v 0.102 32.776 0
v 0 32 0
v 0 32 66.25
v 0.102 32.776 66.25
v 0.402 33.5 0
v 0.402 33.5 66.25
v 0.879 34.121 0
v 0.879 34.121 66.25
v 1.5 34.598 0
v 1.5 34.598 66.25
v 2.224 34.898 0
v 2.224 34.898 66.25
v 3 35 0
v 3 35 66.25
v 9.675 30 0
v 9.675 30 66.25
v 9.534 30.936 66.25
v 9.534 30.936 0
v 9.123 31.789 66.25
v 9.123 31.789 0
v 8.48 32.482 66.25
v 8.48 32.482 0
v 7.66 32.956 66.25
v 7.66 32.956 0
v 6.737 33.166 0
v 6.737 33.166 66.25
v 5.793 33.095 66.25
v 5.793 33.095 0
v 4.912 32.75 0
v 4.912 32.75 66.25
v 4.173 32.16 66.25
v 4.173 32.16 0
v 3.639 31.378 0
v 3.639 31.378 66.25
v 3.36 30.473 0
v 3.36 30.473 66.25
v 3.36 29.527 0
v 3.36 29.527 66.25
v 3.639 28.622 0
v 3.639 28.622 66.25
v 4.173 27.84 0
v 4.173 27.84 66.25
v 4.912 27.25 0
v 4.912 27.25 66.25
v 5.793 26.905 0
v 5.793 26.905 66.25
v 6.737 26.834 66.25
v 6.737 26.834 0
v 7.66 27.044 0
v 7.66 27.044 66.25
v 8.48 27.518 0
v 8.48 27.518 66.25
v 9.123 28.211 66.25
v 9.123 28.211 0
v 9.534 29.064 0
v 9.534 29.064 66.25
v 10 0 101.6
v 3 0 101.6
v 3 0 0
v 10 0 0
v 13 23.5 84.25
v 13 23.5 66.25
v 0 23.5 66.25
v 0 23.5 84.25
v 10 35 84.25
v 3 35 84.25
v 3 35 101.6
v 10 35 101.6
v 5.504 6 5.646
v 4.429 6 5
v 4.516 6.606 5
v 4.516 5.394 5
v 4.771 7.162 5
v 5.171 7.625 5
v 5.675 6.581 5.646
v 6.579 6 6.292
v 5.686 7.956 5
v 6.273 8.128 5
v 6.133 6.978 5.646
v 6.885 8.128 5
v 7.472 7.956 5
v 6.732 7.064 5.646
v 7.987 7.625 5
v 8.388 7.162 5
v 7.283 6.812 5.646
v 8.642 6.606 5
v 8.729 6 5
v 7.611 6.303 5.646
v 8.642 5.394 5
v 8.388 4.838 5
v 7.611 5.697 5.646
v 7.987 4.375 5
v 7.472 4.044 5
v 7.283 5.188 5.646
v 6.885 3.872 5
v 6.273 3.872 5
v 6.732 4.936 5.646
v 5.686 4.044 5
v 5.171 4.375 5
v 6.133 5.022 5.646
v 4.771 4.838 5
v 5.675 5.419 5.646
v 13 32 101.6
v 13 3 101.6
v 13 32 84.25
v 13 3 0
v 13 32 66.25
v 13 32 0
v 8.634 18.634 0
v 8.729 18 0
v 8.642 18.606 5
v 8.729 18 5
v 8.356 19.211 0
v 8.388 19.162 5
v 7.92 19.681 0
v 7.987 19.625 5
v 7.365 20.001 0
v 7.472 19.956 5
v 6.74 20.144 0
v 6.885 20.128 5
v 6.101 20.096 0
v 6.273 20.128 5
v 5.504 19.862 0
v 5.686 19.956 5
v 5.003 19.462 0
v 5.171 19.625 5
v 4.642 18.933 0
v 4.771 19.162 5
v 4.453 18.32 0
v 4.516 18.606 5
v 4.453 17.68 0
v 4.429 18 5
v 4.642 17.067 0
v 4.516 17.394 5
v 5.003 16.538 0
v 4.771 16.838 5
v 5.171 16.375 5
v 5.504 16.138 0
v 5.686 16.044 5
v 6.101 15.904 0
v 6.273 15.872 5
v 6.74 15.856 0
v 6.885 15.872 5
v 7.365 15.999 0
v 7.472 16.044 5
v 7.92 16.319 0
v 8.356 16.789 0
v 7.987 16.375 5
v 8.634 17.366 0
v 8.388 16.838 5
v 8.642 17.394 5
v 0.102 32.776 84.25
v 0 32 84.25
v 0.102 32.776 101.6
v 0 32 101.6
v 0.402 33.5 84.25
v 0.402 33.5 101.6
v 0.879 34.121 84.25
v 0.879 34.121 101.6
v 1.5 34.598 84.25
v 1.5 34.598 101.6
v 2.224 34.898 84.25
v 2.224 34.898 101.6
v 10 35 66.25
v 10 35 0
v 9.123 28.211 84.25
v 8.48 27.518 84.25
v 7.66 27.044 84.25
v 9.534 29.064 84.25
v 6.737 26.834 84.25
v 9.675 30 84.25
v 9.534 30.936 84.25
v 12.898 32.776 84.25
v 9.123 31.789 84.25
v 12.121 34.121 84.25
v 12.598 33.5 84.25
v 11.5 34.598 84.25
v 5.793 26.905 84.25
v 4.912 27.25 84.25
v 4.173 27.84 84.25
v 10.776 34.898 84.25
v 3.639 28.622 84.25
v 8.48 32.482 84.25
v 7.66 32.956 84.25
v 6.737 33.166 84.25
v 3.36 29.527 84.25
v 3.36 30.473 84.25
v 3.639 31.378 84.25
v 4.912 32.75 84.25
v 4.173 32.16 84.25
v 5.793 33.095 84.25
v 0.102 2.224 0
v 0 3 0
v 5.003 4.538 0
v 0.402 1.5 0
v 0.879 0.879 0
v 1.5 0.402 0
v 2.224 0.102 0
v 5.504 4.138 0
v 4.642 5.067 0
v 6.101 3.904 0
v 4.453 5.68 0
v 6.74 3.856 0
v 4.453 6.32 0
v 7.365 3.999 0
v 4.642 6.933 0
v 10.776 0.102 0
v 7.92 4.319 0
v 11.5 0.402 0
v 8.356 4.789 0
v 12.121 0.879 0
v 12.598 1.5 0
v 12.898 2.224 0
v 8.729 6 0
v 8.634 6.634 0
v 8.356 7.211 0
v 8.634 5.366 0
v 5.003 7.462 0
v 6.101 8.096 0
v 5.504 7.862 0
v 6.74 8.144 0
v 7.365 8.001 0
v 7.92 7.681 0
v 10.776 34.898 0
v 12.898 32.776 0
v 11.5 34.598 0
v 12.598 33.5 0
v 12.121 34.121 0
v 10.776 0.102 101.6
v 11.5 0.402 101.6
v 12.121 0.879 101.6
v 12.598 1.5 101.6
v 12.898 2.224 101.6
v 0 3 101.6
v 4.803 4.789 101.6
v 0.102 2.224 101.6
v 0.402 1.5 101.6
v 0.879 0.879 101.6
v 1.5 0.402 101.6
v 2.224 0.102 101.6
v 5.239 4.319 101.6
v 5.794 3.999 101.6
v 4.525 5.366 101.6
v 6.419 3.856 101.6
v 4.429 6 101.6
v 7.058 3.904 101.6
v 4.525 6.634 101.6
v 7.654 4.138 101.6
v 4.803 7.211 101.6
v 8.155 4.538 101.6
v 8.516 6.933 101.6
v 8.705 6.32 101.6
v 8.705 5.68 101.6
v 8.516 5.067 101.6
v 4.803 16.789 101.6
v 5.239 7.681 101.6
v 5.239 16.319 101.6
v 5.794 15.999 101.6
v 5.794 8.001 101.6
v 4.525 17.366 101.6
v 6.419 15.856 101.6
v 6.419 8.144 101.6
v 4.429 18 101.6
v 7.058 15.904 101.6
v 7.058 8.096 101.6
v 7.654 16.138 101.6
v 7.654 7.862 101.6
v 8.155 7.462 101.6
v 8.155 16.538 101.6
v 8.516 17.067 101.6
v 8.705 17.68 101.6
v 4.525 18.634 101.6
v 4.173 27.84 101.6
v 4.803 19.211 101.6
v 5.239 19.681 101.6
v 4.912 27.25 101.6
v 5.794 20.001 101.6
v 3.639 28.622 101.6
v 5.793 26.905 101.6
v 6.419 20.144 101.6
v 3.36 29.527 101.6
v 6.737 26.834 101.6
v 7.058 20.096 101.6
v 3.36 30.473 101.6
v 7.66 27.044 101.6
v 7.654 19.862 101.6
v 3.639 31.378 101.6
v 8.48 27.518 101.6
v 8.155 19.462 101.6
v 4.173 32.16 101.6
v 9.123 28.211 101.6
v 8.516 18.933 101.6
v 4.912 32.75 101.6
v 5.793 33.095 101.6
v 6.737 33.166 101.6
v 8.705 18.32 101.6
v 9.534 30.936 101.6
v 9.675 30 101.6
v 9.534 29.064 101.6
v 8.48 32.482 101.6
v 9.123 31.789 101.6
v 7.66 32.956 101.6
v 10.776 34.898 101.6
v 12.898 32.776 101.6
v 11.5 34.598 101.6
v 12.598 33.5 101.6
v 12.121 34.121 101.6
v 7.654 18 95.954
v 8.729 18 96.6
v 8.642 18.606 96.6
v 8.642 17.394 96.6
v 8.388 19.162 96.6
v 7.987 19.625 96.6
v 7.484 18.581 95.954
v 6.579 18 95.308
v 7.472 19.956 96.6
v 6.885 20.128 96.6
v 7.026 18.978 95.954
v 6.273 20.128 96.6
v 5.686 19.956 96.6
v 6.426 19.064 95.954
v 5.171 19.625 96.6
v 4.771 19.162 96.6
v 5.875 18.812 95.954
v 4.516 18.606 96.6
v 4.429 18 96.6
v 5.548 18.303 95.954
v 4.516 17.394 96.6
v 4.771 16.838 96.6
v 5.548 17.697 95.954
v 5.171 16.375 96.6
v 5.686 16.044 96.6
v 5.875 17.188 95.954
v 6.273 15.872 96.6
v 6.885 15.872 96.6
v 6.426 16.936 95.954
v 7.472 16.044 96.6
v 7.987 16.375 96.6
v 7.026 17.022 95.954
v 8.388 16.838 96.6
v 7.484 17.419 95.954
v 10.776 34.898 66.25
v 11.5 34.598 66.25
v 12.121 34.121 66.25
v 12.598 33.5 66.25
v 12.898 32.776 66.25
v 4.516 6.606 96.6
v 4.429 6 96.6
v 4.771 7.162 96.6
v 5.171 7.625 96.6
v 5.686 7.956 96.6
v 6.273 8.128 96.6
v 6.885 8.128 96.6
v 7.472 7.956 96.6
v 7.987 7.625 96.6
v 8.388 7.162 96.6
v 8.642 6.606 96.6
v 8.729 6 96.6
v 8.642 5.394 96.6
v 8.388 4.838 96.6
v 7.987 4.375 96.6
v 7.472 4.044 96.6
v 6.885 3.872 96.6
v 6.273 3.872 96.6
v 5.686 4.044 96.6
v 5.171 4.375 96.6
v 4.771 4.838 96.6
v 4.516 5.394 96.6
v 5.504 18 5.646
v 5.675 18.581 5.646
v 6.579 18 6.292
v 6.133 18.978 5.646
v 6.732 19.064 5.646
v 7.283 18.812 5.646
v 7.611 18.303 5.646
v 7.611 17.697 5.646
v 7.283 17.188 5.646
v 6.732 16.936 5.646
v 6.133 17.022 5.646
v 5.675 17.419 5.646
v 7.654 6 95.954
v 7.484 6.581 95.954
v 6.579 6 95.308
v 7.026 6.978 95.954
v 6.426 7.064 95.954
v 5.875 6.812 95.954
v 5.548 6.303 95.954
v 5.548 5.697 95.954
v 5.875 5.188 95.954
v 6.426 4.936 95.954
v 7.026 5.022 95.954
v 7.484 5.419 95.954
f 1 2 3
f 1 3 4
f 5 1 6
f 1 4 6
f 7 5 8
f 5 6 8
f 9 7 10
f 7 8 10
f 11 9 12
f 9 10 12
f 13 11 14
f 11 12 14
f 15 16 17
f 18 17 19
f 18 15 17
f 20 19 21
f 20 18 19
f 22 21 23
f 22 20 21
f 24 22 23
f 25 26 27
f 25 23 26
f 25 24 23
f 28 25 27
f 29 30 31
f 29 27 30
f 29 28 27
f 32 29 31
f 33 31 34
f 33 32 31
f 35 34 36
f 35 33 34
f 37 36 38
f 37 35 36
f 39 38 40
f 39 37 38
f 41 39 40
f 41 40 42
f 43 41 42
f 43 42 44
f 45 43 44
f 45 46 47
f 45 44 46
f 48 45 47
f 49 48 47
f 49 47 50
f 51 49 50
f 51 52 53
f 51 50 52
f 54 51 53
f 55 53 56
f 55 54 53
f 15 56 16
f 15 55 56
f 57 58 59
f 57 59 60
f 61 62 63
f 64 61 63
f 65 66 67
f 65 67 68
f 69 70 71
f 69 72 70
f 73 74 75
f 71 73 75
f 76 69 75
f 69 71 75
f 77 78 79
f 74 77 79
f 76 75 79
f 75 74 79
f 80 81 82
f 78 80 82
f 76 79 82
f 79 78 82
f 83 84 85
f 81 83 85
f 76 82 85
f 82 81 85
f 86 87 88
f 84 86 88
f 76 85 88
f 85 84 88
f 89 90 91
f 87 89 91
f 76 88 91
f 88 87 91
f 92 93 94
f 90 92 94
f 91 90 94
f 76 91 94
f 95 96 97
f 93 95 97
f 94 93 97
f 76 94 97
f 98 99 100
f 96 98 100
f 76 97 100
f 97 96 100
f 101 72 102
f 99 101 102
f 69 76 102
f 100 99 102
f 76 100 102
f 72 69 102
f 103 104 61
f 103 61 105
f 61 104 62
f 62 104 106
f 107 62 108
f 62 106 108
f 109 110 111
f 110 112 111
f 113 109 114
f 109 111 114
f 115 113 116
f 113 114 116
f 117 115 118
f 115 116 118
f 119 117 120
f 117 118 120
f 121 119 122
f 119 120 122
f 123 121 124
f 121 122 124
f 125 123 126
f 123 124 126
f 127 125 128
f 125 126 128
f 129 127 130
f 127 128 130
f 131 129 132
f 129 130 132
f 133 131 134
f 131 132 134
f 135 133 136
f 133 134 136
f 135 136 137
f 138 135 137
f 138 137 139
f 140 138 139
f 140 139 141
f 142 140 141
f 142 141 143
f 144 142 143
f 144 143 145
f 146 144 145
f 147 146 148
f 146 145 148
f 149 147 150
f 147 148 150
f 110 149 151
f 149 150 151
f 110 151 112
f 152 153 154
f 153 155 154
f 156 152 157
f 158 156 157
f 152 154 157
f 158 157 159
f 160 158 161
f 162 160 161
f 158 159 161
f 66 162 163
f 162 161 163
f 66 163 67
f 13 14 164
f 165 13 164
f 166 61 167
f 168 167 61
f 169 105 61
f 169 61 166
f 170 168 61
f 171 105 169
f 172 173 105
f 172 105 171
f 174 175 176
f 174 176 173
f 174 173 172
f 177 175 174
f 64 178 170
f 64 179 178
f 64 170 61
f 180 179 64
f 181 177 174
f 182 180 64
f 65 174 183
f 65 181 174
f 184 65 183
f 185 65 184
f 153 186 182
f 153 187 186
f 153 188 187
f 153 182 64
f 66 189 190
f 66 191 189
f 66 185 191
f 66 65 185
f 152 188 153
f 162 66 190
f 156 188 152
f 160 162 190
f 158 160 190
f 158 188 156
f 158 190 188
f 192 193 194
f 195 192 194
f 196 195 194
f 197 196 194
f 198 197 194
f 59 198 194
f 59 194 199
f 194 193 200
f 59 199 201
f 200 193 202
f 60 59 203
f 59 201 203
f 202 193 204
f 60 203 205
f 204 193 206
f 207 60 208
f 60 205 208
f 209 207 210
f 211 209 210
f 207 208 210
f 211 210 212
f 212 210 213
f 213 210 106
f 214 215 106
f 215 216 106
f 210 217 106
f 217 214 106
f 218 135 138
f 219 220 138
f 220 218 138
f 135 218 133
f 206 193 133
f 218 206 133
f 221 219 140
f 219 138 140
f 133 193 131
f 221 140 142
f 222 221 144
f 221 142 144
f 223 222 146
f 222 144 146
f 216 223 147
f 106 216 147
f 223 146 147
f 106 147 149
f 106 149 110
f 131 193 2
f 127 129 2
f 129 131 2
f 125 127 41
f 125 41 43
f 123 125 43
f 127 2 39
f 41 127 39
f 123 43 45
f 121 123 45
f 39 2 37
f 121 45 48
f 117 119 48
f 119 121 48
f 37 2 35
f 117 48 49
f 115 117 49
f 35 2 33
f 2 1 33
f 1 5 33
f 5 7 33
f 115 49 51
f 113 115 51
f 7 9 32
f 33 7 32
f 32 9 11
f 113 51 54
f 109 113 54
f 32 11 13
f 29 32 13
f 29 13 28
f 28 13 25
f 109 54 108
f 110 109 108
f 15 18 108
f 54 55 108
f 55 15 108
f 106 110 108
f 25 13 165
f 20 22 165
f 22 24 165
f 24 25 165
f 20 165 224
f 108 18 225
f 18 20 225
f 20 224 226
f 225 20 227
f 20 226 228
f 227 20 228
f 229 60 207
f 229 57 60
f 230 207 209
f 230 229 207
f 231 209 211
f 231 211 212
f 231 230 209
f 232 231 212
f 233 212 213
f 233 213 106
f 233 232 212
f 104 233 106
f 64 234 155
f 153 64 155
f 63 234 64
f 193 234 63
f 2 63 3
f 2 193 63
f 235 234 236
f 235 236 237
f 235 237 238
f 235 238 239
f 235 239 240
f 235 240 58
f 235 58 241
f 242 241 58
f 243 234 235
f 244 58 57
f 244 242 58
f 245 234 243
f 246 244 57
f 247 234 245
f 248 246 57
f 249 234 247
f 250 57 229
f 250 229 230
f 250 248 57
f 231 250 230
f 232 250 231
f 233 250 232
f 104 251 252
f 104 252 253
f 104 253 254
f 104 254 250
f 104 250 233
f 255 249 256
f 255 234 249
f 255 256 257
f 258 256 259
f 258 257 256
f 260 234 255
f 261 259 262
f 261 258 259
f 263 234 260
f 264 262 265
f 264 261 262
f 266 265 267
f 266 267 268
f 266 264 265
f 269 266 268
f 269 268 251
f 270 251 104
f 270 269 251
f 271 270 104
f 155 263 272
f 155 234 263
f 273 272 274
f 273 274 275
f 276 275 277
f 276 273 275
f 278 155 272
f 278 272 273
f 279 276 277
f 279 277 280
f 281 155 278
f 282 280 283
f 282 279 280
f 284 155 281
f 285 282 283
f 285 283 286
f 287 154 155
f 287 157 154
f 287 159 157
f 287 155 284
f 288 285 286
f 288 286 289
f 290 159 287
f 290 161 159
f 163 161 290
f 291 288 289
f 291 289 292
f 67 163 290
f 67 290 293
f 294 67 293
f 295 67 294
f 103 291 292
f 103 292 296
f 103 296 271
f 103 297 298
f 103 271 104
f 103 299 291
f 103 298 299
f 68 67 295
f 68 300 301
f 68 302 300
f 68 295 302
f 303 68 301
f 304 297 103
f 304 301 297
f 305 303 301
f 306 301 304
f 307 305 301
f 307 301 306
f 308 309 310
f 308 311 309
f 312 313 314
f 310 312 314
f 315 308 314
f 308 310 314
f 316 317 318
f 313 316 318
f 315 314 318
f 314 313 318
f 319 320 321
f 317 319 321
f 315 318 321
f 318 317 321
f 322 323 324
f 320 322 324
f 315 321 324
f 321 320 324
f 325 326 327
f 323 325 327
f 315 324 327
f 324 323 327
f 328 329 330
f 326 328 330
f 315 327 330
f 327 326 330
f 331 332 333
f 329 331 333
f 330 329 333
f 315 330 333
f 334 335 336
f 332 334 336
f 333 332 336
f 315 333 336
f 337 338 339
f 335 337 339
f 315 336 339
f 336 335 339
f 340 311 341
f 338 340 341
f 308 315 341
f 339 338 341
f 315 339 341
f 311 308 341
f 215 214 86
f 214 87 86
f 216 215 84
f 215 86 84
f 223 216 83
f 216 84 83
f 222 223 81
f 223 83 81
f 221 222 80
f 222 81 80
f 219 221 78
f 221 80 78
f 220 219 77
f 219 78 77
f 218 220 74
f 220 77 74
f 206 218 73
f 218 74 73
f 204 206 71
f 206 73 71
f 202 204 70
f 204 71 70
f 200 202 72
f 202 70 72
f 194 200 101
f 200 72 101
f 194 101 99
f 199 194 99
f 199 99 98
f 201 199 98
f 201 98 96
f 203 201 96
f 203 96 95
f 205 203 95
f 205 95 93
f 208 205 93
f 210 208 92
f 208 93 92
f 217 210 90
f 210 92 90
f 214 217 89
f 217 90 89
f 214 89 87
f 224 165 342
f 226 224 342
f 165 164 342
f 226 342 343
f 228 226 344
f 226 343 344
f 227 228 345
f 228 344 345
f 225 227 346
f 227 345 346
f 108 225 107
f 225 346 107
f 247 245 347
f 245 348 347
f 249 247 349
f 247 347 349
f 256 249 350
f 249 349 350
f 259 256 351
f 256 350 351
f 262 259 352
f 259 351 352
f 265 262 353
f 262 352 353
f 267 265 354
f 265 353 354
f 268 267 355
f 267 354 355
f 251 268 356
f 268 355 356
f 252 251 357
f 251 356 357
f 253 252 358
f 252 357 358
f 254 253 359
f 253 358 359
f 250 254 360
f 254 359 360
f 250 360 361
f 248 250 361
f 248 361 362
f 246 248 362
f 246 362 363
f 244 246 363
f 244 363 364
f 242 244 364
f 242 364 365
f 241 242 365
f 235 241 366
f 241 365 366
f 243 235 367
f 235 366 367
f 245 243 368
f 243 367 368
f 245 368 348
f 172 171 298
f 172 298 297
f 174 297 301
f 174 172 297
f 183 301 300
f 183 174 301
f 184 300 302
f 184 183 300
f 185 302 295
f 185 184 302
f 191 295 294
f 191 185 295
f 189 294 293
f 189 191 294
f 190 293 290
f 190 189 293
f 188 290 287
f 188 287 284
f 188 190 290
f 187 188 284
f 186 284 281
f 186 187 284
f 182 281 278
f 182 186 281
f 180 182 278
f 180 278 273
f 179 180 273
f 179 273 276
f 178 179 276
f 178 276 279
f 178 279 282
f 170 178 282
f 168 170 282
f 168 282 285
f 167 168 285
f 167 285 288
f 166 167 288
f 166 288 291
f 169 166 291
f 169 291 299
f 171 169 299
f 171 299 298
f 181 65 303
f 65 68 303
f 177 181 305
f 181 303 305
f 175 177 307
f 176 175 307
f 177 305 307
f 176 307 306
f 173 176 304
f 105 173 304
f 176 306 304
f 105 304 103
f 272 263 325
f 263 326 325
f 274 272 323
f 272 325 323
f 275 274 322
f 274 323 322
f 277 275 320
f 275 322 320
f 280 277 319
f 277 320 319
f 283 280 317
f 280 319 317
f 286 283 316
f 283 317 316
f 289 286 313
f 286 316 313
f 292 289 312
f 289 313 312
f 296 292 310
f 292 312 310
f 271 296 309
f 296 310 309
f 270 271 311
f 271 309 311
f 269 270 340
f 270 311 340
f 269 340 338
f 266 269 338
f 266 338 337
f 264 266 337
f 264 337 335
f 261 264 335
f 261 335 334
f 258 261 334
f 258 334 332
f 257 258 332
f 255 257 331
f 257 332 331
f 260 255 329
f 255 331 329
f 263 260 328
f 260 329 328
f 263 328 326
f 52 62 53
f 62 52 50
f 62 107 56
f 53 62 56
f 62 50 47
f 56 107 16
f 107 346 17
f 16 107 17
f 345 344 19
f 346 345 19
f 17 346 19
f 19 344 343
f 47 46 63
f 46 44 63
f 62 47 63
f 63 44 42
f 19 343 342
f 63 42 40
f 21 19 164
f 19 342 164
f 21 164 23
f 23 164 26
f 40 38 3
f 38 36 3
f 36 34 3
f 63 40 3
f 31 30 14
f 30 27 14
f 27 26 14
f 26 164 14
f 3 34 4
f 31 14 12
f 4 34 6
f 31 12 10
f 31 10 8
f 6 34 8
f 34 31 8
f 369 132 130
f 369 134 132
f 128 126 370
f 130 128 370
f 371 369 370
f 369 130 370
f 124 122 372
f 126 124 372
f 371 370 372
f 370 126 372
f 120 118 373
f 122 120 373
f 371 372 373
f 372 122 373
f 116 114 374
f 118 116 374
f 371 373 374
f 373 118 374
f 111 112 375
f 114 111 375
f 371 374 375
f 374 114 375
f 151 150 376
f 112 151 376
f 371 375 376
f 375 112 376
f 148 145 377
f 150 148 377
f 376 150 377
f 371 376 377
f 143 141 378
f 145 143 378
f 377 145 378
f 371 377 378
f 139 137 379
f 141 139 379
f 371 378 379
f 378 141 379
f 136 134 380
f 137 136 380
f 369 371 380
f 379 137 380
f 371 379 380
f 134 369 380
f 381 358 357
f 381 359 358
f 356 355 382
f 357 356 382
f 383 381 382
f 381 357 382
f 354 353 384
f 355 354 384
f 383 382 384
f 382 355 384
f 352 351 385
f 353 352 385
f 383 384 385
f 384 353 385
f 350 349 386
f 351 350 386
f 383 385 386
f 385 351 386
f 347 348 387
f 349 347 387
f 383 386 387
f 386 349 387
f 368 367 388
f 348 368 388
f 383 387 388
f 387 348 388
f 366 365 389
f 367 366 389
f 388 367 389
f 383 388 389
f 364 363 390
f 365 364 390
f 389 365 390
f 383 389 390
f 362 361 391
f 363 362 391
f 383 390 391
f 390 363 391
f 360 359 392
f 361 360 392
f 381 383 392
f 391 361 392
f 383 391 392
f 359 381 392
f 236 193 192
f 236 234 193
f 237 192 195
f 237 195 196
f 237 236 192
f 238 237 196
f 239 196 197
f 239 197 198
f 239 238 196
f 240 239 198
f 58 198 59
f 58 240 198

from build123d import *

# Parameters (mm, degrees)
SKETCH1_W                = 13
SKETCH1_H                = 35
SKETCH1_R                = 3.175
BOSS_EXTRUDE1_DEPTH      = 101.6
CUT_EXTRUDE1_DEPTH       = 9
M4_CLEARANCE_HOLE1_D     = 4.3
M4_CLEARANCE_HOLE1_DEPTH = 5
M4_CLEARANCE_HOLE1_TIP   = 1.291850331
M4_CLEARANCE_HOLE2_D     = 4.3
M4_CLEARANCE_HOLE2_DEPTH = 5
M4_CLEARANCE_HOLE2_TIP   = 1.291850331
FILLET1_R                = 3


with BuildPart() as part:
    # Sketch1 → Boss-Extrude1 (new body)
    with BuildSketch(Plane.XY):
        with Locations((6.5, 17.5)):
            Rectangle(SKETCH1_W, SKETCH1_H)
        with Locations((6.5, 30)):
            Circle(SKETCH1_R, mode=Mode.SUBTRACT)
    extrude(amount=BOSS_EXTRUDE1_DEPTH)

    # Sketch2 → Cut-Extrude1 (cut, symmetric)
    with BuildSketch(Plane.XY.offset(75.25)):
        Polygon((0, 30), (0, 35), (13, 35), (13, 30), (13, 23.5), (0, 23.5), align=None)
    extrude(amount=CUT_EXTRUDE1_DEPTH, both=True, mode=Mode.SUBTRACT)

    # M4 Clearance Hole1
    with Locations(Plane(origin=(0, 0, 0), x_dir=(-1, 0, 0), z_dir=(0, 0, -1))):
        with Locations((-6.579246302, 18), (-6.579246302, 6)):
            Hole(M4_CLEARANCE_HOLE1_D / 2, depth=M4_CLEARANCE_HOLE1_DEPTH)
            with Locations((0, 0, -(M4_CLEARANCE_HOLE1_DEPTH + M4_CLEARANCE_HOLE1_TIP / 2))):  # 118° drill point
                Cone(0, M4_CLEARANCE_HOLE1_D / 2, M4_CLEARANCE_HOLE1_TIP, mode=Mode.SUBTRACT)

    # M4 Clearance Hole2
    with Locations(Plane.XY.offset(101.6)):
        with Locations((6.579246302, 18), (6.579246302, 6)):
            Hole(M4_CLEARANCE_HOLE2_D / 2, depth=M4_CLEARANCE_HOLE2_DEPTH)
            with Locations((0, 0, -(M4_CLEARANCE_HOLE2_DEPTH + M4_CLEARANCE_HOLE2_TIP / 2))):  # 118° drill point
                Cone(0, M4_CLEARANCE_HOLE2_D / 2, M4_CLEARANCE_HOLE2_TIP, mode=Mode.SUBTRACT)

    # Fillet1
    fillet1_edges = [part.edges().sort_by_distance(p)[0] for p in [
        (0, 35, 33.125),
        (13, 35, 33.125),
        (0, 35, 92.925),
        (13, 35, 92.925),
        (13, 0, 50.8),
        (0, 0, 50.8),
    ]]
    fillet(fillet1_edges, radius=FILLET1_R)


solid = part.part
